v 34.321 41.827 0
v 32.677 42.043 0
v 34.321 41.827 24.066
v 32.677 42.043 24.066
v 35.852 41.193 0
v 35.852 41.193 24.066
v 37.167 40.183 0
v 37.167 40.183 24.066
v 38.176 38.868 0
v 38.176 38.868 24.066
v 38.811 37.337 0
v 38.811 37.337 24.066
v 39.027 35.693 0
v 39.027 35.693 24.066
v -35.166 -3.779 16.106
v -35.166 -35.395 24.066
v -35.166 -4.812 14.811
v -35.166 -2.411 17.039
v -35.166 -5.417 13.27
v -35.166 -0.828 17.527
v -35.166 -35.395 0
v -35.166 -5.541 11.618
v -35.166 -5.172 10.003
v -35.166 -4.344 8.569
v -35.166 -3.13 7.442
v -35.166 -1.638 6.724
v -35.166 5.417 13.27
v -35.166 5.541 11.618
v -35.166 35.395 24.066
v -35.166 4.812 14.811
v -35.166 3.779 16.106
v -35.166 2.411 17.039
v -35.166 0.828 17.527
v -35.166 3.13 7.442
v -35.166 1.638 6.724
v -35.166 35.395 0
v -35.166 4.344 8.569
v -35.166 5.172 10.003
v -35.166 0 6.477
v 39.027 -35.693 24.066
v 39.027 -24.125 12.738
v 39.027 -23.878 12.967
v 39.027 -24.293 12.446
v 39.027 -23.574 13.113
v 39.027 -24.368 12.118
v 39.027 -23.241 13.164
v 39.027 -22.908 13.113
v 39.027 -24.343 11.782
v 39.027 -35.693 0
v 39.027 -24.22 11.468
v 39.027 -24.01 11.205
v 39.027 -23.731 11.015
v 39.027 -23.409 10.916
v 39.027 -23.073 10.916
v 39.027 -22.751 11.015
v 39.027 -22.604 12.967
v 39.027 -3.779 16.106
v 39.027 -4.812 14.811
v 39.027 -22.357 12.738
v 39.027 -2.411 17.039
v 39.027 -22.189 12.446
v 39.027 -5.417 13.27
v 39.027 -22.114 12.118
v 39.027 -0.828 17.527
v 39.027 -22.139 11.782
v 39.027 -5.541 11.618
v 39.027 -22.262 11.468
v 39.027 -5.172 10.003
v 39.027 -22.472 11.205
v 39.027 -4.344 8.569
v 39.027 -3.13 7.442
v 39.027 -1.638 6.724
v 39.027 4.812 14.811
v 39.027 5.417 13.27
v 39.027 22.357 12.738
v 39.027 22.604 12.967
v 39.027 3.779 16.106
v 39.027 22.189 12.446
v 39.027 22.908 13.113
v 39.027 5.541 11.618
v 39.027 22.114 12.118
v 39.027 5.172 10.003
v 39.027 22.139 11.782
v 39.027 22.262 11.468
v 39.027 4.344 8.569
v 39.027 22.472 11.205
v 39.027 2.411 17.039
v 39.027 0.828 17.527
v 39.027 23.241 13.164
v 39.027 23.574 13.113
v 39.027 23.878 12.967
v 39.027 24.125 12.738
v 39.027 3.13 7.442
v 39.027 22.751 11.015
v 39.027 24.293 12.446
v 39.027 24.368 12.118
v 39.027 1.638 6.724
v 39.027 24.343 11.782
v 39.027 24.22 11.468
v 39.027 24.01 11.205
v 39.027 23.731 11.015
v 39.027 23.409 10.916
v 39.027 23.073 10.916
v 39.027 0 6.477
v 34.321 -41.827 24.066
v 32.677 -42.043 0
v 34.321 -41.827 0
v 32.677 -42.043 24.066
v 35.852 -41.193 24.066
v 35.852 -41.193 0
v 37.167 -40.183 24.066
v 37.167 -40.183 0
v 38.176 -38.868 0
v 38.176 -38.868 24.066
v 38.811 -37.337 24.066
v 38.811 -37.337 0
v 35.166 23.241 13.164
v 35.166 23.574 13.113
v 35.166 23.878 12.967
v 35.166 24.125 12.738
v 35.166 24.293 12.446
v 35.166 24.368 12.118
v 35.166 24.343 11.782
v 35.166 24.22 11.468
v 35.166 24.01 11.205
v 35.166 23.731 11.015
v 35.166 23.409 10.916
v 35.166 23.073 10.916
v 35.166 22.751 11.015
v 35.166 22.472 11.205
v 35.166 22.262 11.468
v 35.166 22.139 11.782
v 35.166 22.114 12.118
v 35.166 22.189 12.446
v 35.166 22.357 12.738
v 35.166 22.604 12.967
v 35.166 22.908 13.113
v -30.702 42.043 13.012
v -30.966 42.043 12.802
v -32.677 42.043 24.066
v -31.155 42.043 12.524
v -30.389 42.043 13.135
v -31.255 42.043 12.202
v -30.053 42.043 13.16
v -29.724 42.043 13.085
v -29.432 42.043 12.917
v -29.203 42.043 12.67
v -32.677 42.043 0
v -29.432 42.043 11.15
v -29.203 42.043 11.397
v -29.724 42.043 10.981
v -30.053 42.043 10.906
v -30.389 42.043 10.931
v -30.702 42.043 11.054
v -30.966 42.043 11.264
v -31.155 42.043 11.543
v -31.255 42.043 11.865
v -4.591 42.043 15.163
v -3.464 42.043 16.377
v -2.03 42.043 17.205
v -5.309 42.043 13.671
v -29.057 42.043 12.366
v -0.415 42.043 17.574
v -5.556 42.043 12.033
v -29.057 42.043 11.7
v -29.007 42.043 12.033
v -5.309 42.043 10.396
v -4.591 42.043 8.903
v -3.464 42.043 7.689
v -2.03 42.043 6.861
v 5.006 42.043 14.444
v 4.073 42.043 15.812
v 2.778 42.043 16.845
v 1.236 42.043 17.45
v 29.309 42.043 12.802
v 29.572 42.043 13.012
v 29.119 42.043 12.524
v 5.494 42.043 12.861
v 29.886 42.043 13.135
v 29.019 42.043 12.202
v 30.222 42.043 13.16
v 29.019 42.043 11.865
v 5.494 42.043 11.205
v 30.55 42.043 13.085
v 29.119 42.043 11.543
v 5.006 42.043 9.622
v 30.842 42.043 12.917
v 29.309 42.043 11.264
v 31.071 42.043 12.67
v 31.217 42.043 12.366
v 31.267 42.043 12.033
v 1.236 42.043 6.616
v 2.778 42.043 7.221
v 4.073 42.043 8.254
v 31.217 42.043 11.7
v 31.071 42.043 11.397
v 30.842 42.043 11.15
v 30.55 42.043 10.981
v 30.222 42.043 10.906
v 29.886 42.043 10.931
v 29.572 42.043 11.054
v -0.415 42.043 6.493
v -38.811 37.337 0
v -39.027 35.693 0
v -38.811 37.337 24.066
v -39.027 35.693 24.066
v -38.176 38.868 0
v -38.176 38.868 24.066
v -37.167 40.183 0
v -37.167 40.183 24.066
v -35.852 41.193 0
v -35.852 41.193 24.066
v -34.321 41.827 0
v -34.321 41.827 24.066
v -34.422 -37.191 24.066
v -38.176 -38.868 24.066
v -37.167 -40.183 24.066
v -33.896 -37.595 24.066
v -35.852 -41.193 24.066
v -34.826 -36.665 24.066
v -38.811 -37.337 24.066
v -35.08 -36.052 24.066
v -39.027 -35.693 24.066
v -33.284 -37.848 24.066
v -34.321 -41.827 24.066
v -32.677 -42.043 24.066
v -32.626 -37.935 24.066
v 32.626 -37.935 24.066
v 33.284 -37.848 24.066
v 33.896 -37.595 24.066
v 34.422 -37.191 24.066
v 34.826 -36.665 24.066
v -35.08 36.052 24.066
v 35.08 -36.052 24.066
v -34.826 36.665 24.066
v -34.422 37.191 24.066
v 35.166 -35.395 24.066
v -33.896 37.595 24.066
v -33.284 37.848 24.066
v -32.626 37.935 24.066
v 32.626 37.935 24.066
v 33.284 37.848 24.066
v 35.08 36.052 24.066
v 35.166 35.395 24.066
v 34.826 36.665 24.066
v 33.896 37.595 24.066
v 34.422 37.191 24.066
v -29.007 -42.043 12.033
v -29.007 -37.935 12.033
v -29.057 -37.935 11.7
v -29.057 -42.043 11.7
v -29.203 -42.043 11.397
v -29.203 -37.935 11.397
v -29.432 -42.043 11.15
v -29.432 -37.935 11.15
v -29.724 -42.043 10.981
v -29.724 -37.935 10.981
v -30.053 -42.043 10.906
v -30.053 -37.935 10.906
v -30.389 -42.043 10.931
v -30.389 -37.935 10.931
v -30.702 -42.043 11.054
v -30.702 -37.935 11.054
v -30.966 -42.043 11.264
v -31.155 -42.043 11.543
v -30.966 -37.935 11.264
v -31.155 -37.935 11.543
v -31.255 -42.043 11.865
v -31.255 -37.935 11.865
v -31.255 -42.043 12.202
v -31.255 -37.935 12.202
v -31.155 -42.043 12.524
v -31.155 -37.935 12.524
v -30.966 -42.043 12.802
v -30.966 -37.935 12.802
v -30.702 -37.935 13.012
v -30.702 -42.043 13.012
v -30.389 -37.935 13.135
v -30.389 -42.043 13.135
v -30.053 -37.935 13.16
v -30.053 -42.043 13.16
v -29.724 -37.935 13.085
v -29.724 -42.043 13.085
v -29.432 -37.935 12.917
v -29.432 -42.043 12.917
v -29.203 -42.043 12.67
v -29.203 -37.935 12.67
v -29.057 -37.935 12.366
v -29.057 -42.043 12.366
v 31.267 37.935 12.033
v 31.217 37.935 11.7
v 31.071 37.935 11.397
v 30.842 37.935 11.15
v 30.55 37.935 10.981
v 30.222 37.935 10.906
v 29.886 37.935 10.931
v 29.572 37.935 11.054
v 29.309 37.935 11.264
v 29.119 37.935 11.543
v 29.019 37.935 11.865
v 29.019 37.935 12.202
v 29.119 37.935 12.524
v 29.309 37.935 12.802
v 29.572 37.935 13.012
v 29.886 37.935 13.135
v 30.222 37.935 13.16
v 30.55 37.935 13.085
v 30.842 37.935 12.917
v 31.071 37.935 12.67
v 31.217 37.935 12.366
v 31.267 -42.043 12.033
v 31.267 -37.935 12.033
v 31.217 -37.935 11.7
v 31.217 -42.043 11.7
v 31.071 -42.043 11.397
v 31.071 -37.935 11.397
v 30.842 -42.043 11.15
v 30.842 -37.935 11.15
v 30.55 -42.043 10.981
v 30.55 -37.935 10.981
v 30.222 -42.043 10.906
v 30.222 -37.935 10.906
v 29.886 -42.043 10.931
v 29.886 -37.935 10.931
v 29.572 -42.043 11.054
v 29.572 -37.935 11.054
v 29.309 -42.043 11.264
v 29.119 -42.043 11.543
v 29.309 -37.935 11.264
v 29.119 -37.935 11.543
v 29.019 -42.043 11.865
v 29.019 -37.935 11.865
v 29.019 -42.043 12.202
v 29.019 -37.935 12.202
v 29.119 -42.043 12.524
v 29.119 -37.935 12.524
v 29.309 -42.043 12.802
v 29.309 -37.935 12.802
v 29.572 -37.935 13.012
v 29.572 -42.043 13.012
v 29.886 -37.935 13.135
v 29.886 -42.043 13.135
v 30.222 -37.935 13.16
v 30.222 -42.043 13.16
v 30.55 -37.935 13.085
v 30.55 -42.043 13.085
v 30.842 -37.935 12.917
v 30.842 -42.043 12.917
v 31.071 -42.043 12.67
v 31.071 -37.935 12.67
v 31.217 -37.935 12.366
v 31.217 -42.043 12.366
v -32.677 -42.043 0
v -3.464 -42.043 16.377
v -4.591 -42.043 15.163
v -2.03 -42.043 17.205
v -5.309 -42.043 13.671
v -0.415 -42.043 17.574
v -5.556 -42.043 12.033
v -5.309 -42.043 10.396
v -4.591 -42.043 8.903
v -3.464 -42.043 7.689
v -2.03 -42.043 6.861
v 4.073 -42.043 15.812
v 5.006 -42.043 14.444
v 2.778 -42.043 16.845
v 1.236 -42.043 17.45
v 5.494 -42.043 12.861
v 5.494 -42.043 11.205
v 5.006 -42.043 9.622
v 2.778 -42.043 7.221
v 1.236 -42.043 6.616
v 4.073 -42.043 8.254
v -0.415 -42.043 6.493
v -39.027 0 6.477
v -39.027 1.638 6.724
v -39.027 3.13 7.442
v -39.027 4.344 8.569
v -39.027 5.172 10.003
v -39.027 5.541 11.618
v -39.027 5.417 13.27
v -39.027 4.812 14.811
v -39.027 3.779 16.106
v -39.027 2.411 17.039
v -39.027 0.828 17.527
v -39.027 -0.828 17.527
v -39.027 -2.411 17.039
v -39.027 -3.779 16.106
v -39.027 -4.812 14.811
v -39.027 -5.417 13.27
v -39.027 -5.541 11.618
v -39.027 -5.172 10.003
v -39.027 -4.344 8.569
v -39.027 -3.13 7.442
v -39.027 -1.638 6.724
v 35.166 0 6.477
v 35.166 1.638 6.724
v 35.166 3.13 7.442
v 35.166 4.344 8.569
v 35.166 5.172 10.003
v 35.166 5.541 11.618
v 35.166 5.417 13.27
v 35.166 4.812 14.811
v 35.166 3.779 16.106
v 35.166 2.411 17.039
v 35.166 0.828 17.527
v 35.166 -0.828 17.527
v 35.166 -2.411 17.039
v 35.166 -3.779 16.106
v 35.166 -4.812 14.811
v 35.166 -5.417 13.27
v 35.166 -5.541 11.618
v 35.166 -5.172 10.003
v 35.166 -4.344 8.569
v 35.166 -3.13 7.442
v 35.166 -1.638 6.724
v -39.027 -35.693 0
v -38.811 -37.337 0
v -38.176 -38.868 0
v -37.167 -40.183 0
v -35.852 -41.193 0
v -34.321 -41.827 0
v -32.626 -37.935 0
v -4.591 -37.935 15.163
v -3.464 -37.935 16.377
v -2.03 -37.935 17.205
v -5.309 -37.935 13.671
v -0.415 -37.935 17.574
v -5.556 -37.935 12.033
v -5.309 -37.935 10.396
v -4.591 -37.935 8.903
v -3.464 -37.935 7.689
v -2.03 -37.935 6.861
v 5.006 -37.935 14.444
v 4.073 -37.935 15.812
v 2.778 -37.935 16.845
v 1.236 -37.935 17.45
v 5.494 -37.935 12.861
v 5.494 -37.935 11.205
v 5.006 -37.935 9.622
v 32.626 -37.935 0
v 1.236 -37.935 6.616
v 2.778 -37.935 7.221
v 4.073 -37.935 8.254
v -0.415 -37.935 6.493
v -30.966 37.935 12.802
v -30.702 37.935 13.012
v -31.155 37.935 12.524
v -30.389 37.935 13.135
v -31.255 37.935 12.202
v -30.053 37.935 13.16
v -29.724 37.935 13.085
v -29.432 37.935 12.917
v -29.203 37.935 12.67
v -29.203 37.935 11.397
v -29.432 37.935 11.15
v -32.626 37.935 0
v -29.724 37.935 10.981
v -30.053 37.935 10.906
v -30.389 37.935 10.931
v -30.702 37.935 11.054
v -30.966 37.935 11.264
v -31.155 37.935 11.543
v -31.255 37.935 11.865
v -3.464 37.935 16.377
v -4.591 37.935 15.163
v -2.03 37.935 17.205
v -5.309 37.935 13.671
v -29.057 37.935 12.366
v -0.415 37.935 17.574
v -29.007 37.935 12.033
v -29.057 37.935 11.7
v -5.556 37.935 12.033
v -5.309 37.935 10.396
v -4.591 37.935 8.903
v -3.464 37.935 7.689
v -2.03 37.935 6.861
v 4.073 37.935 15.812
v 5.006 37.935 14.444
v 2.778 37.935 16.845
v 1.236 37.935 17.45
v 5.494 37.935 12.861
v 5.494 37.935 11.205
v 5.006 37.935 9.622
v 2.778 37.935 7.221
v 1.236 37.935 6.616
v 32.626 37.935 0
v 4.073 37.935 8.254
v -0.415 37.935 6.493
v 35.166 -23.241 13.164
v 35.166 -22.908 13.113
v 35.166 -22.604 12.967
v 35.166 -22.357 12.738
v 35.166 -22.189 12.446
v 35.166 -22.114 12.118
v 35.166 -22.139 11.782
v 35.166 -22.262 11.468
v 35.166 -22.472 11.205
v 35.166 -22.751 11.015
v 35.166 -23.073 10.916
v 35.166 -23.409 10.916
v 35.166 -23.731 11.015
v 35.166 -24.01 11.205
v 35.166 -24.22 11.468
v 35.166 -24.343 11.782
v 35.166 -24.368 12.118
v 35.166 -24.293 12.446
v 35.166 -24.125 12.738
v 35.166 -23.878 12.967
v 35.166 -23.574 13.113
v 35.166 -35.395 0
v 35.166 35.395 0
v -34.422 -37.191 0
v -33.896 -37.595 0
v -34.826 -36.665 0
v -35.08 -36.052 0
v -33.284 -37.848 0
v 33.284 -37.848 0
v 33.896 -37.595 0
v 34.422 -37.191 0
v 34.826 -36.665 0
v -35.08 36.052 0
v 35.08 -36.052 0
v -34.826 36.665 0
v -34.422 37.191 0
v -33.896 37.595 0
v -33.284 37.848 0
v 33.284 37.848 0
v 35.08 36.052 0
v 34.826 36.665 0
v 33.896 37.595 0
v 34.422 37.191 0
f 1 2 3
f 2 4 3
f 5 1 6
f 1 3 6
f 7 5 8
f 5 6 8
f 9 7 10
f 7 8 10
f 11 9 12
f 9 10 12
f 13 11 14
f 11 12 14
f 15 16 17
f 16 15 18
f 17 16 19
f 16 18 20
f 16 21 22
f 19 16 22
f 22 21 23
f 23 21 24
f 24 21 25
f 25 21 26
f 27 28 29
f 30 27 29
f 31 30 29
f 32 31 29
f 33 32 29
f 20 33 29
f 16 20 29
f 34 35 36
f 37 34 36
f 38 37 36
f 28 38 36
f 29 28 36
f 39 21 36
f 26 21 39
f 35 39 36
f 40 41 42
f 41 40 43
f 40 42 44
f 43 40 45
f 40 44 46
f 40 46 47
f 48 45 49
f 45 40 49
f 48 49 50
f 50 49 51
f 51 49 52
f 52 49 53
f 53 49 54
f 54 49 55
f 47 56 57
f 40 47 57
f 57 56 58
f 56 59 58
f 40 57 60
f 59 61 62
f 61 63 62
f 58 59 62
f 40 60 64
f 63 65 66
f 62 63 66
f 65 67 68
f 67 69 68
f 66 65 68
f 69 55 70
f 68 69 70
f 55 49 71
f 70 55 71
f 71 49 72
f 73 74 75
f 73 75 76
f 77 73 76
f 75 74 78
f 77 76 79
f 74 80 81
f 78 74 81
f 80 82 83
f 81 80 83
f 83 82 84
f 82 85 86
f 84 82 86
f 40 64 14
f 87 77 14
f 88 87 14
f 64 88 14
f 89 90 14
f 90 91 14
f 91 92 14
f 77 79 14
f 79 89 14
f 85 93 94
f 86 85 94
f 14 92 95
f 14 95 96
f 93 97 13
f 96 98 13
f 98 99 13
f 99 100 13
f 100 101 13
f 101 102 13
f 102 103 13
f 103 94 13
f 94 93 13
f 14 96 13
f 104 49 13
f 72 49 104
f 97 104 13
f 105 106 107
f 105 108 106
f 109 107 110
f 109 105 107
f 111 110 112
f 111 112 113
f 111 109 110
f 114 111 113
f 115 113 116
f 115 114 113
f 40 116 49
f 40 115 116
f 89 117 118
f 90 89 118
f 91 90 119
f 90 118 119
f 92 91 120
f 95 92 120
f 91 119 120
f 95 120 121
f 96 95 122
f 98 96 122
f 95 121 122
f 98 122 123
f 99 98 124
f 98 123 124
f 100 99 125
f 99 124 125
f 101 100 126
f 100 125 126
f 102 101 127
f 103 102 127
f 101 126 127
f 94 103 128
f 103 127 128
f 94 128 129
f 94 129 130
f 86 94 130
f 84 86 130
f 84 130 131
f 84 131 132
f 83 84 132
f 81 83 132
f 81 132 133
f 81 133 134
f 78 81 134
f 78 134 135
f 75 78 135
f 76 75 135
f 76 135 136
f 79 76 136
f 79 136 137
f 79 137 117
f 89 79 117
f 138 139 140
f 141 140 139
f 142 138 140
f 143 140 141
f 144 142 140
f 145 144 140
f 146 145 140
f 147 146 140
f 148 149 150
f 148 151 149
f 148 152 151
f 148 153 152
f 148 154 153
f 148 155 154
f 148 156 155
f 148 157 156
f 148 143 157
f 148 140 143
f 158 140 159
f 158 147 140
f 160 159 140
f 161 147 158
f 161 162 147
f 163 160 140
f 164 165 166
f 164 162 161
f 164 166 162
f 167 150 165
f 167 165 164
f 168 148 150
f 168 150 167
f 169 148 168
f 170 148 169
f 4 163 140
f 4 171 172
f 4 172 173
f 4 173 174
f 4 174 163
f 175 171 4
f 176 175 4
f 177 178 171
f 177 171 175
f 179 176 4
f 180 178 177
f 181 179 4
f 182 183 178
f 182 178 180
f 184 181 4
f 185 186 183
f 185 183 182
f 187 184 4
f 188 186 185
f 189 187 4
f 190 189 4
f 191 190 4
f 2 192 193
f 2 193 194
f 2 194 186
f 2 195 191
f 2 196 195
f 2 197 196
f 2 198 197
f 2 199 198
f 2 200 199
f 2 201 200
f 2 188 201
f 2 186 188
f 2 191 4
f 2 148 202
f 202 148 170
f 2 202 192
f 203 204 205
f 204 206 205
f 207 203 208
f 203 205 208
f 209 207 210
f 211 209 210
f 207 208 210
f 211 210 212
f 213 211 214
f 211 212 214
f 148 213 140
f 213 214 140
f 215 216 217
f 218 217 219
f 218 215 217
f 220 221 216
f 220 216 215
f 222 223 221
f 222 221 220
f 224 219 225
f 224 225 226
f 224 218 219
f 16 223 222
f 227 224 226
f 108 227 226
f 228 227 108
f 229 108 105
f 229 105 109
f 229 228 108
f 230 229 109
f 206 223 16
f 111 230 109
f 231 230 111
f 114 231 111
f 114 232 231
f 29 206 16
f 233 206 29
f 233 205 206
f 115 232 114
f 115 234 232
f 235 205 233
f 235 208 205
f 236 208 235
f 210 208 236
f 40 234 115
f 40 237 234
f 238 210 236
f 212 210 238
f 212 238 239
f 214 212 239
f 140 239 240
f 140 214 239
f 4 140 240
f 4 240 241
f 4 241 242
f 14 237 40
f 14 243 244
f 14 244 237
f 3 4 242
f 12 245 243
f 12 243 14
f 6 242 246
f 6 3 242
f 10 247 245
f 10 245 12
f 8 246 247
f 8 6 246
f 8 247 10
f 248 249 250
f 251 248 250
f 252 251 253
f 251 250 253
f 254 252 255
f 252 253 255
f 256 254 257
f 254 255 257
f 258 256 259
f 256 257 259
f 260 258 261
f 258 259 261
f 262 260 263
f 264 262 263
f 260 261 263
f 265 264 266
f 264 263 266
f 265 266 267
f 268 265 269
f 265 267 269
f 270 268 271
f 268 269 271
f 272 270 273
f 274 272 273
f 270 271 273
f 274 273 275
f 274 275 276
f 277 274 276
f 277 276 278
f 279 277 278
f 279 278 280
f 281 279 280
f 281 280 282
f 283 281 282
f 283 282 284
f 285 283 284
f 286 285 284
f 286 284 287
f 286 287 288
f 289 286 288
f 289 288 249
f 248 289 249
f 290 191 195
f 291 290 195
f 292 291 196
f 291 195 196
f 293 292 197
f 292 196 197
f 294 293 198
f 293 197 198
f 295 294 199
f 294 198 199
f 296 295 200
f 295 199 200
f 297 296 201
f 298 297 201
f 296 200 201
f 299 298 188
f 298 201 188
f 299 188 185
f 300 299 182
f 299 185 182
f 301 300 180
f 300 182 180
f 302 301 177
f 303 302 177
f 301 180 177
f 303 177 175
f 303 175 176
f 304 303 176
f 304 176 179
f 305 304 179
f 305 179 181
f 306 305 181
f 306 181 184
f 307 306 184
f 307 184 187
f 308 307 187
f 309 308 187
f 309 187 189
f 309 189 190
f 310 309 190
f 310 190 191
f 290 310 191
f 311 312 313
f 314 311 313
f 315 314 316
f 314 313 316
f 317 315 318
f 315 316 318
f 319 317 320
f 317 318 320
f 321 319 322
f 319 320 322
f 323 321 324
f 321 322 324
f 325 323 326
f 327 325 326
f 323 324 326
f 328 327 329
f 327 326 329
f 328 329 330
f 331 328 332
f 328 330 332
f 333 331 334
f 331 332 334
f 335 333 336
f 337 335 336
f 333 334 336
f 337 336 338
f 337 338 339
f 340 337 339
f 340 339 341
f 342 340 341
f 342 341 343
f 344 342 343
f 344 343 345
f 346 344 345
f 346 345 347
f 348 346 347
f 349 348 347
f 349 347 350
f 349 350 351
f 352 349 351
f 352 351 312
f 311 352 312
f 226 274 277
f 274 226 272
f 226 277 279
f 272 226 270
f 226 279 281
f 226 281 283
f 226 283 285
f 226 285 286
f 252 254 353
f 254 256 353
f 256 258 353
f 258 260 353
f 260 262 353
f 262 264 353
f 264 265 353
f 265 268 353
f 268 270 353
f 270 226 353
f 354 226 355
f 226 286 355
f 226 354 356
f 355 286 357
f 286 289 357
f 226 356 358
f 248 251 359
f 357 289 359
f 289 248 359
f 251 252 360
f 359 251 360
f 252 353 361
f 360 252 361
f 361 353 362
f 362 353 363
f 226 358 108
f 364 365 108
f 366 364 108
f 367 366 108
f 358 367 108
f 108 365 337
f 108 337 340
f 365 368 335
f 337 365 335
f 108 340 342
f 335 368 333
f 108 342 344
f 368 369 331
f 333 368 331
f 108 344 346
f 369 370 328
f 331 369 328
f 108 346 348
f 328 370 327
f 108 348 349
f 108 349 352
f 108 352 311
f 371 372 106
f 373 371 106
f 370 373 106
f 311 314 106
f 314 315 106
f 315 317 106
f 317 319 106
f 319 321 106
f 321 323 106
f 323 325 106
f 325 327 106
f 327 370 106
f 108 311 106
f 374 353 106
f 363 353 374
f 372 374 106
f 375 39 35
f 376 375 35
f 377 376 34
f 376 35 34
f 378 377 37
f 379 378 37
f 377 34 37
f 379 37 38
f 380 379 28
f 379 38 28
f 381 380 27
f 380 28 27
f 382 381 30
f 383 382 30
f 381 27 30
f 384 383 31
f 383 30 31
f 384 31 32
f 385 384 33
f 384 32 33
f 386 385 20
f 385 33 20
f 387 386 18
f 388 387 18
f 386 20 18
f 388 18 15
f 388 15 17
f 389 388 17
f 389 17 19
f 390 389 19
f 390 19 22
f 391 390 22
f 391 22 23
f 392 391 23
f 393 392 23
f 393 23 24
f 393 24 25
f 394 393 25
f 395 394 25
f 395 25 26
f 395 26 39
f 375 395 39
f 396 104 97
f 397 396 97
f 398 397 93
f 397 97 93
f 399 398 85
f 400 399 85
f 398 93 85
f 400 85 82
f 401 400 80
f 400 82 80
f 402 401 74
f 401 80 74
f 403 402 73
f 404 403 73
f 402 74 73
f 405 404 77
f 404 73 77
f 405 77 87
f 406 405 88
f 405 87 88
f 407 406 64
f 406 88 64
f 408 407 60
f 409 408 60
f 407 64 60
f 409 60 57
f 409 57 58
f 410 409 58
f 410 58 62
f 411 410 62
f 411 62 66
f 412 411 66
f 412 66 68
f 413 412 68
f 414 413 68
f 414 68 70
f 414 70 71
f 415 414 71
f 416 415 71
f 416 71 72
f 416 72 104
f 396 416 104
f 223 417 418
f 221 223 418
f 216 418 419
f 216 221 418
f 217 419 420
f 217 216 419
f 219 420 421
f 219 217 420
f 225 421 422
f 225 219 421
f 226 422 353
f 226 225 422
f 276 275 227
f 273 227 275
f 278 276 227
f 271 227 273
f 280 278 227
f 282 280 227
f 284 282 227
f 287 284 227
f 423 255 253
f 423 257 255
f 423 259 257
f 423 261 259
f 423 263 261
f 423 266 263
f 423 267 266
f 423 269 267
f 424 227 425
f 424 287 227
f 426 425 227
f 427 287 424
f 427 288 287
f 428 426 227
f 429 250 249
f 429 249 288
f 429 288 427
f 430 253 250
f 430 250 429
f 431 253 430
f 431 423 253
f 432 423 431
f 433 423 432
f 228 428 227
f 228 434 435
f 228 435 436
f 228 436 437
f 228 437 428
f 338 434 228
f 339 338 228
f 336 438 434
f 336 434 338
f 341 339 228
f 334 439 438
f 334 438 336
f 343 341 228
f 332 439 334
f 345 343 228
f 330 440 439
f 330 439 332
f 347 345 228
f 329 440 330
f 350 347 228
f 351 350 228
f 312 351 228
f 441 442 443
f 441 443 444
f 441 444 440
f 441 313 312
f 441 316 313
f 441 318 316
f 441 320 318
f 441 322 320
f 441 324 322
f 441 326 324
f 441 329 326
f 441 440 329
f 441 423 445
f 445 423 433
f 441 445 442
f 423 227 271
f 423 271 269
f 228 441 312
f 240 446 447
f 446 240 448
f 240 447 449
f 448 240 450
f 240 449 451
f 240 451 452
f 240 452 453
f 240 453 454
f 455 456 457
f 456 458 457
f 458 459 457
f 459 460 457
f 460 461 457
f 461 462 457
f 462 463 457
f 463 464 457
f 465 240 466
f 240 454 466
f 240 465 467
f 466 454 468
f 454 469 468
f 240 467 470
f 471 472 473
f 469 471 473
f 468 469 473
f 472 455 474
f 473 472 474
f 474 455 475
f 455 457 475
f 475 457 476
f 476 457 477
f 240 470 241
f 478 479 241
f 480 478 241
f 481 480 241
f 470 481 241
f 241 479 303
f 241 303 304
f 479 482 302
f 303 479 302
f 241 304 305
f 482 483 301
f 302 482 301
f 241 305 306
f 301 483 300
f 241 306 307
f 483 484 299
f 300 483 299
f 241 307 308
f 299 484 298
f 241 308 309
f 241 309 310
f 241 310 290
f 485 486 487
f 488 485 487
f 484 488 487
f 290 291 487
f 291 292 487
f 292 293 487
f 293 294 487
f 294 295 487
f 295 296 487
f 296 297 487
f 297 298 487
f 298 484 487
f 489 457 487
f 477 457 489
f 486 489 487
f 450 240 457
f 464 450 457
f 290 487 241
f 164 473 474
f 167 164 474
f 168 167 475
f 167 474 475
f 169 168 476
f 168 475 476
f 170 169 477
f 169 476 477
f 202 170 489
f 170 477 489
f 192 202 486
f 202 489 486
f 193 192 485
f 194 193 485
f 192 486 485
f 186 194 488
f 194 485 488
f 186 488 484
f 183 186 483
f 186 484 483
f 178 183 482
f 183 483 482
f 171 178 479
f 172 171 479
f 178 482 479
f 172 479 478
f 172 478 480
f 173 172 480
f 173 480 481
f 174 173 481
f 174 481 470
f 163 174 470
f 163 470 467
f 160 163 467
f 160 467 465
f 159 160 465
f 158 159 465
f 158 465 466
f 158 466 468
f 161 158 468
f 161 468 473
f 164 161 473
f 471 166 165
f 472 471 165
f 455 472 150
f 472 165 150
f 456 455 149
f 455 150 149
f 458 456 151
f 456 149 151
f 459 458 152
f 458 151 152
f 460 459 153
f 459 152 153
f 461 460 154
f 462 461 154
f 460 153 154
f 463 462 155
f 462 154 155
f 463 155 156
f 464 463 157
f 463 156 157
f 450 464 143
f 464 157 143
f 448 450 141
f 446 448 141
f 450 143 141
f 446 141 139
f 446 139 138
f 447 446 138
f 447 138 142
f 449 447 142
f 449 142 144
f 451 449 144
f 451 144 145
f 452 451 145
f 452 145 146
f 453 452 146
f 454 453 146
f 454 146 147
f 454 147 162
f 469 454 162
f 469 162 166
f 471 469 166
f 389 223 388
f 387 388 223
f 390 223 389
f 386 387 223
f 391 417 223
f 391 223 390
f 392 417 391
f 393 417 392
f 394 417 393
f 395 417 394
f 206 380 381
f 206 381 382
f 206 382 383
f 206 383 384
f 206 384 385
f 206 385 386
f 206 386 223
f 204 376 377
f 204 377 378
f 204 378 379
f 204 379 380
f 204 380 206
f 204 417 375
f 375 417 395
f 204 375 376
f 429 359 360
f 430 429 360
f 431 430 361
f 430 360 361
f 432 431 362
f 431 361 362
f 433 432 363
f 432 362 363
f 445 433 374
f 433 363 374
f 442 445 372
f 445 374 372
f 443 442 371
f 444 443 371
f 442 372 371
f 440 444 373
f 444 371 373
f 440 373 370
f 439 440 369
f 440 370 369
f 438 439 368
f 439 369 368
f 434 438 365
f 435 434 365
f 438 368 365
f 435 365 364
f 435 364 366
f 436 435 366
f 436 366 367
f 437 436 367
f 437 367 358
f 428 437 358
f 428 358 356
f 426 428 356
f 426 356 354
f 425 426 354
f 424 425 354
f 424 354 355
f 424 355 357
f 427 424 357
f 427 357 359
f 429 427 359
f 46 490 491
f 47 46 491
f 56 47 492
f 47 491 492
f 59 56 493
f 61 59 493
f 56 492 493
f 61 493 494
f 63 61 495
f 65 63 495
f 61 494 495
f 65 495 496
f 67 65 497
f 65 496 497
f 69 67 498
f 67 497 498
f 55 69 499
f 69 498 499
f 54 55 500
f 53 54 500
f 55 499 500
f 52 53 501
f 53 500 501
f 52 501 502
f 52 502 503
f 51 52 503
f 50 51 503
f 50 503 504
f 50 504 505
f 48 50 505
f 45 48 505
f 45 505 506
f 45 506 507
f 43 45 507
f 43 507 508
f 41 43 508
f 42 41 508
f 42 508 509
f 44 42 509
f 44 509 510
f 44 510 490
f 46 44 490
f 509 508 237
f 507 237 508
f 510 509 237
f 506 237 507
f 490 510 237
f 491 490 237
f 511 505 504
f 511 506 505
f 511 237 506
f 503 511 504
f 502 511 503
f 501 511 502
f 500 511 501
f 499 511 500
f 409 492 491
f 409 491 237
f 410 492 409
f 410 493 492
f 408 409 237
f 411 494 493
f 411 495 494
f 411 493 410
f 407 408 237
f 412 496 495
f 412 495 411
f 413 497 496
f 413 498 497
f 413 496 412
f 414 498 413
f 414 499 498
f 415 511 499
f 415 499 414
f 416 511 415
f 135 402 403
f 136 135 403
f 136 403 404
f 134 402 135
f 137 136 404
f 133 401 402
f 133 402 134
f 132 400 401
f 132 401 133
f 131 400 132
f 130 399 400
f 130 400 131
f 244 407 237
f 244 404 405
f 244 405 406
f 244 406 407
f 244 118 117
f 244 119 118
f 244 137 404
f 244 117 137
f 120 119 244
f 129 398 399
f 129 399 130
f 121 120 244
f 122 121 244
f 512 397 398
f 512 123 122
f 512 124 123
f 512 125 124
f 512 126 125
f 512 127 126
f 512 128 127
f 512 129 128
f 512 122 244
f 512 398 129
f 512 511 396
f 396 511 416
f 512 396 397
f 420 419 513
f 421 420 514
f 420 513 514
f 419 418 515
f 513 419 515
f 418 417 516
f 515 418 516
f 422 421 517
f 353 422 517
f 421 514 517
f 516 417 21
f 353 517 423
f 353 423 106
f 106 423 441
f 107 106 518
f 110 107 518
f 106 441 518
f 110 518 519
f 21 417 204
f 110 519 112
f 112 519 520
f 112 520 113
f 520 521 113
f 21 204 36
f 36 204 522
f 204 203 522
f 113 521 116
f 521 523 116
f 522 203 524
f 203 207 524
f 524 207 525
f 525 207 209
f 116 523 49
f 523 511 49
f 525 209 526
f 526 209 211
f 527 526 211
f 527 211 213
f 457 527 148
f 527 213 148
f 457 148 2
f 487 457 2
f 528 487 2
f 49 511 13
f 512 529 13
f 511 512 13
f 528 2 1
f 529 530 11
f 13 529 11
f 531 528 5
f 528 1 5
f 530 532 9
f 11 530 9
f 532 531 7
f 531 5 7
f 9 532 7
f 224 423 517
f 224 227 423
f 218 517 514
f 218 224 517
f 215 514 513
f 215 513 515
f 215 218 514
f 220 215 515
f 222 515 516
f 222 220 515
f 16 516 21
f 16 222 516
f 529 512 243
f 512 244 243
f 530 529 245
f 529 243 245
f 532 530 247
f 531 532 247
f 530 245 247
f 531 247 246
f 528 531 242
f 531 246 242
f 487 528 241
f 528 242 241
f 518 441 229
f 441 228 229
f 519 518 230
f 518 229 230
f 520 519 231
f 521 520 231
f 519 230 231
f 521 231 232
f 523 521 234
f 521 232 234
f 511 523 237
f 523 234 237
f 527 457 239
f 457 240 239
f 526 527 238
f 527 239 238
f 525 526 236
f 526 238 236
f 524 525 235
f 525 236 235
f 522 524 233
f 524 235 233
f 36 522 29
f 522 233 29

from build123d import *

# Parameters (mm, degrees)
SKETCH2_W                      = 78.0542
SKETCH2_H                      = 84.0867
SKETCH2_W_2                    = 70.3326
SKETCH2_H_2                    = 75.8698
BOSS_EXTRUDE1_DEPTH            = 24.0665
F_7_16_0_4375_DIAMETER_HOLE1_D = 11.1125
F_7_16_0_4375_DIAMETER_HOLE2_D = 11.1125
FILLET2_R                      = 6.35
FILLET3_R                      = 2.54
F_4_40_TAPPED_HOLE1_D          = 2.2606
F_4_40_TAPPED_HOLE1_DEPTH      = 3.8608
F_4_40_TAPPED_HOLE2_D          = 2.2606


with BuildPart() as part:
    # Sketch2 → Boss-Extrude1 (new body)
    with BuildSketch(Plane.XY):
        Rectangle(SKETCH2_W, SKETCH2_H)
        Rectangle(SKETCH2_W_2, SKETCH2_H_2, mode=Mode.SUBTRACT)
    extrude(amount=BOSS_EXTRUDE1_DEPTH)

    # 7/16 (0.4375) Diameter Hole1 (through all)
    with Locations(Plane.ZY.offset(39.0271)):
        with Locations((12.03325, 0)):
            Hole(F_7_16_0_4375_DIAMETER_HOLE1_D / 2)

    # 7/16 (0.4375) Diameter Hole2 (through all)
    with Locations(Plane(origin=(0, 42.04335, 0), x_dir=(1, 0, 0), z_dir=(0, 1, 0))):
        with Locations((0, -12.03325)):
            Hole(F_7_16_0_4375_DIAMETER_HOLE2_D / 2)

    # Fillet2
    fillet2_edges = [part.edges().sort_by_distance(p)[0] for p in [
        (39.0271, -42.04335, 12.03325),
        (-39.0271, -42.04335, 12.03325),
        (-39.0271, 42.04335, 12.03325),
        (39.0271, 42.04335, 12.03325),
    ]]
    fillet(fillet2_edges, radius=FILLET2_R)

    # Fillet3
    fillet3_edges = [part.edges().sort_by_distance(p)[0] for p in [
        (35.1663, -37.9349, 12.03325),
        (35.1663, 37.9349, 12.03325),
        (-35.1663, 37.9349, 12.03325),
        (-35.1663, -37.9349, 12.03325),
    ]]
    fillet(fillet3_edges, radius=FILLET3_R)

    # #4-40 Tapped Hole1
    with Locations(Plane(origin=(39.0271, 0, 0), x_dir=(0, 0, -1), z_dir=(1, 0, 0))):
        with Locations((-12.03325, 23.241), (-12.03325, -23.241)):
            Hole(F_4_40_TAPPED_HOLE1_D / 2, depth=F_4_40_TAPPED_HOLE1_DEPTH)

    # #4-40 Tapped Hole2 (through all)
    with Locations(Plane(origin=(0, -42.04335, 0), x_dir=(-1, 0, 0), z_dir=(0, -1, 0))):
        with Locations((-30.1371, -12.03325), (30.1371, -12.03325)):
            Hole(F_4_40_TAPPED_HOLE2_D / 2)


solid = part.part
